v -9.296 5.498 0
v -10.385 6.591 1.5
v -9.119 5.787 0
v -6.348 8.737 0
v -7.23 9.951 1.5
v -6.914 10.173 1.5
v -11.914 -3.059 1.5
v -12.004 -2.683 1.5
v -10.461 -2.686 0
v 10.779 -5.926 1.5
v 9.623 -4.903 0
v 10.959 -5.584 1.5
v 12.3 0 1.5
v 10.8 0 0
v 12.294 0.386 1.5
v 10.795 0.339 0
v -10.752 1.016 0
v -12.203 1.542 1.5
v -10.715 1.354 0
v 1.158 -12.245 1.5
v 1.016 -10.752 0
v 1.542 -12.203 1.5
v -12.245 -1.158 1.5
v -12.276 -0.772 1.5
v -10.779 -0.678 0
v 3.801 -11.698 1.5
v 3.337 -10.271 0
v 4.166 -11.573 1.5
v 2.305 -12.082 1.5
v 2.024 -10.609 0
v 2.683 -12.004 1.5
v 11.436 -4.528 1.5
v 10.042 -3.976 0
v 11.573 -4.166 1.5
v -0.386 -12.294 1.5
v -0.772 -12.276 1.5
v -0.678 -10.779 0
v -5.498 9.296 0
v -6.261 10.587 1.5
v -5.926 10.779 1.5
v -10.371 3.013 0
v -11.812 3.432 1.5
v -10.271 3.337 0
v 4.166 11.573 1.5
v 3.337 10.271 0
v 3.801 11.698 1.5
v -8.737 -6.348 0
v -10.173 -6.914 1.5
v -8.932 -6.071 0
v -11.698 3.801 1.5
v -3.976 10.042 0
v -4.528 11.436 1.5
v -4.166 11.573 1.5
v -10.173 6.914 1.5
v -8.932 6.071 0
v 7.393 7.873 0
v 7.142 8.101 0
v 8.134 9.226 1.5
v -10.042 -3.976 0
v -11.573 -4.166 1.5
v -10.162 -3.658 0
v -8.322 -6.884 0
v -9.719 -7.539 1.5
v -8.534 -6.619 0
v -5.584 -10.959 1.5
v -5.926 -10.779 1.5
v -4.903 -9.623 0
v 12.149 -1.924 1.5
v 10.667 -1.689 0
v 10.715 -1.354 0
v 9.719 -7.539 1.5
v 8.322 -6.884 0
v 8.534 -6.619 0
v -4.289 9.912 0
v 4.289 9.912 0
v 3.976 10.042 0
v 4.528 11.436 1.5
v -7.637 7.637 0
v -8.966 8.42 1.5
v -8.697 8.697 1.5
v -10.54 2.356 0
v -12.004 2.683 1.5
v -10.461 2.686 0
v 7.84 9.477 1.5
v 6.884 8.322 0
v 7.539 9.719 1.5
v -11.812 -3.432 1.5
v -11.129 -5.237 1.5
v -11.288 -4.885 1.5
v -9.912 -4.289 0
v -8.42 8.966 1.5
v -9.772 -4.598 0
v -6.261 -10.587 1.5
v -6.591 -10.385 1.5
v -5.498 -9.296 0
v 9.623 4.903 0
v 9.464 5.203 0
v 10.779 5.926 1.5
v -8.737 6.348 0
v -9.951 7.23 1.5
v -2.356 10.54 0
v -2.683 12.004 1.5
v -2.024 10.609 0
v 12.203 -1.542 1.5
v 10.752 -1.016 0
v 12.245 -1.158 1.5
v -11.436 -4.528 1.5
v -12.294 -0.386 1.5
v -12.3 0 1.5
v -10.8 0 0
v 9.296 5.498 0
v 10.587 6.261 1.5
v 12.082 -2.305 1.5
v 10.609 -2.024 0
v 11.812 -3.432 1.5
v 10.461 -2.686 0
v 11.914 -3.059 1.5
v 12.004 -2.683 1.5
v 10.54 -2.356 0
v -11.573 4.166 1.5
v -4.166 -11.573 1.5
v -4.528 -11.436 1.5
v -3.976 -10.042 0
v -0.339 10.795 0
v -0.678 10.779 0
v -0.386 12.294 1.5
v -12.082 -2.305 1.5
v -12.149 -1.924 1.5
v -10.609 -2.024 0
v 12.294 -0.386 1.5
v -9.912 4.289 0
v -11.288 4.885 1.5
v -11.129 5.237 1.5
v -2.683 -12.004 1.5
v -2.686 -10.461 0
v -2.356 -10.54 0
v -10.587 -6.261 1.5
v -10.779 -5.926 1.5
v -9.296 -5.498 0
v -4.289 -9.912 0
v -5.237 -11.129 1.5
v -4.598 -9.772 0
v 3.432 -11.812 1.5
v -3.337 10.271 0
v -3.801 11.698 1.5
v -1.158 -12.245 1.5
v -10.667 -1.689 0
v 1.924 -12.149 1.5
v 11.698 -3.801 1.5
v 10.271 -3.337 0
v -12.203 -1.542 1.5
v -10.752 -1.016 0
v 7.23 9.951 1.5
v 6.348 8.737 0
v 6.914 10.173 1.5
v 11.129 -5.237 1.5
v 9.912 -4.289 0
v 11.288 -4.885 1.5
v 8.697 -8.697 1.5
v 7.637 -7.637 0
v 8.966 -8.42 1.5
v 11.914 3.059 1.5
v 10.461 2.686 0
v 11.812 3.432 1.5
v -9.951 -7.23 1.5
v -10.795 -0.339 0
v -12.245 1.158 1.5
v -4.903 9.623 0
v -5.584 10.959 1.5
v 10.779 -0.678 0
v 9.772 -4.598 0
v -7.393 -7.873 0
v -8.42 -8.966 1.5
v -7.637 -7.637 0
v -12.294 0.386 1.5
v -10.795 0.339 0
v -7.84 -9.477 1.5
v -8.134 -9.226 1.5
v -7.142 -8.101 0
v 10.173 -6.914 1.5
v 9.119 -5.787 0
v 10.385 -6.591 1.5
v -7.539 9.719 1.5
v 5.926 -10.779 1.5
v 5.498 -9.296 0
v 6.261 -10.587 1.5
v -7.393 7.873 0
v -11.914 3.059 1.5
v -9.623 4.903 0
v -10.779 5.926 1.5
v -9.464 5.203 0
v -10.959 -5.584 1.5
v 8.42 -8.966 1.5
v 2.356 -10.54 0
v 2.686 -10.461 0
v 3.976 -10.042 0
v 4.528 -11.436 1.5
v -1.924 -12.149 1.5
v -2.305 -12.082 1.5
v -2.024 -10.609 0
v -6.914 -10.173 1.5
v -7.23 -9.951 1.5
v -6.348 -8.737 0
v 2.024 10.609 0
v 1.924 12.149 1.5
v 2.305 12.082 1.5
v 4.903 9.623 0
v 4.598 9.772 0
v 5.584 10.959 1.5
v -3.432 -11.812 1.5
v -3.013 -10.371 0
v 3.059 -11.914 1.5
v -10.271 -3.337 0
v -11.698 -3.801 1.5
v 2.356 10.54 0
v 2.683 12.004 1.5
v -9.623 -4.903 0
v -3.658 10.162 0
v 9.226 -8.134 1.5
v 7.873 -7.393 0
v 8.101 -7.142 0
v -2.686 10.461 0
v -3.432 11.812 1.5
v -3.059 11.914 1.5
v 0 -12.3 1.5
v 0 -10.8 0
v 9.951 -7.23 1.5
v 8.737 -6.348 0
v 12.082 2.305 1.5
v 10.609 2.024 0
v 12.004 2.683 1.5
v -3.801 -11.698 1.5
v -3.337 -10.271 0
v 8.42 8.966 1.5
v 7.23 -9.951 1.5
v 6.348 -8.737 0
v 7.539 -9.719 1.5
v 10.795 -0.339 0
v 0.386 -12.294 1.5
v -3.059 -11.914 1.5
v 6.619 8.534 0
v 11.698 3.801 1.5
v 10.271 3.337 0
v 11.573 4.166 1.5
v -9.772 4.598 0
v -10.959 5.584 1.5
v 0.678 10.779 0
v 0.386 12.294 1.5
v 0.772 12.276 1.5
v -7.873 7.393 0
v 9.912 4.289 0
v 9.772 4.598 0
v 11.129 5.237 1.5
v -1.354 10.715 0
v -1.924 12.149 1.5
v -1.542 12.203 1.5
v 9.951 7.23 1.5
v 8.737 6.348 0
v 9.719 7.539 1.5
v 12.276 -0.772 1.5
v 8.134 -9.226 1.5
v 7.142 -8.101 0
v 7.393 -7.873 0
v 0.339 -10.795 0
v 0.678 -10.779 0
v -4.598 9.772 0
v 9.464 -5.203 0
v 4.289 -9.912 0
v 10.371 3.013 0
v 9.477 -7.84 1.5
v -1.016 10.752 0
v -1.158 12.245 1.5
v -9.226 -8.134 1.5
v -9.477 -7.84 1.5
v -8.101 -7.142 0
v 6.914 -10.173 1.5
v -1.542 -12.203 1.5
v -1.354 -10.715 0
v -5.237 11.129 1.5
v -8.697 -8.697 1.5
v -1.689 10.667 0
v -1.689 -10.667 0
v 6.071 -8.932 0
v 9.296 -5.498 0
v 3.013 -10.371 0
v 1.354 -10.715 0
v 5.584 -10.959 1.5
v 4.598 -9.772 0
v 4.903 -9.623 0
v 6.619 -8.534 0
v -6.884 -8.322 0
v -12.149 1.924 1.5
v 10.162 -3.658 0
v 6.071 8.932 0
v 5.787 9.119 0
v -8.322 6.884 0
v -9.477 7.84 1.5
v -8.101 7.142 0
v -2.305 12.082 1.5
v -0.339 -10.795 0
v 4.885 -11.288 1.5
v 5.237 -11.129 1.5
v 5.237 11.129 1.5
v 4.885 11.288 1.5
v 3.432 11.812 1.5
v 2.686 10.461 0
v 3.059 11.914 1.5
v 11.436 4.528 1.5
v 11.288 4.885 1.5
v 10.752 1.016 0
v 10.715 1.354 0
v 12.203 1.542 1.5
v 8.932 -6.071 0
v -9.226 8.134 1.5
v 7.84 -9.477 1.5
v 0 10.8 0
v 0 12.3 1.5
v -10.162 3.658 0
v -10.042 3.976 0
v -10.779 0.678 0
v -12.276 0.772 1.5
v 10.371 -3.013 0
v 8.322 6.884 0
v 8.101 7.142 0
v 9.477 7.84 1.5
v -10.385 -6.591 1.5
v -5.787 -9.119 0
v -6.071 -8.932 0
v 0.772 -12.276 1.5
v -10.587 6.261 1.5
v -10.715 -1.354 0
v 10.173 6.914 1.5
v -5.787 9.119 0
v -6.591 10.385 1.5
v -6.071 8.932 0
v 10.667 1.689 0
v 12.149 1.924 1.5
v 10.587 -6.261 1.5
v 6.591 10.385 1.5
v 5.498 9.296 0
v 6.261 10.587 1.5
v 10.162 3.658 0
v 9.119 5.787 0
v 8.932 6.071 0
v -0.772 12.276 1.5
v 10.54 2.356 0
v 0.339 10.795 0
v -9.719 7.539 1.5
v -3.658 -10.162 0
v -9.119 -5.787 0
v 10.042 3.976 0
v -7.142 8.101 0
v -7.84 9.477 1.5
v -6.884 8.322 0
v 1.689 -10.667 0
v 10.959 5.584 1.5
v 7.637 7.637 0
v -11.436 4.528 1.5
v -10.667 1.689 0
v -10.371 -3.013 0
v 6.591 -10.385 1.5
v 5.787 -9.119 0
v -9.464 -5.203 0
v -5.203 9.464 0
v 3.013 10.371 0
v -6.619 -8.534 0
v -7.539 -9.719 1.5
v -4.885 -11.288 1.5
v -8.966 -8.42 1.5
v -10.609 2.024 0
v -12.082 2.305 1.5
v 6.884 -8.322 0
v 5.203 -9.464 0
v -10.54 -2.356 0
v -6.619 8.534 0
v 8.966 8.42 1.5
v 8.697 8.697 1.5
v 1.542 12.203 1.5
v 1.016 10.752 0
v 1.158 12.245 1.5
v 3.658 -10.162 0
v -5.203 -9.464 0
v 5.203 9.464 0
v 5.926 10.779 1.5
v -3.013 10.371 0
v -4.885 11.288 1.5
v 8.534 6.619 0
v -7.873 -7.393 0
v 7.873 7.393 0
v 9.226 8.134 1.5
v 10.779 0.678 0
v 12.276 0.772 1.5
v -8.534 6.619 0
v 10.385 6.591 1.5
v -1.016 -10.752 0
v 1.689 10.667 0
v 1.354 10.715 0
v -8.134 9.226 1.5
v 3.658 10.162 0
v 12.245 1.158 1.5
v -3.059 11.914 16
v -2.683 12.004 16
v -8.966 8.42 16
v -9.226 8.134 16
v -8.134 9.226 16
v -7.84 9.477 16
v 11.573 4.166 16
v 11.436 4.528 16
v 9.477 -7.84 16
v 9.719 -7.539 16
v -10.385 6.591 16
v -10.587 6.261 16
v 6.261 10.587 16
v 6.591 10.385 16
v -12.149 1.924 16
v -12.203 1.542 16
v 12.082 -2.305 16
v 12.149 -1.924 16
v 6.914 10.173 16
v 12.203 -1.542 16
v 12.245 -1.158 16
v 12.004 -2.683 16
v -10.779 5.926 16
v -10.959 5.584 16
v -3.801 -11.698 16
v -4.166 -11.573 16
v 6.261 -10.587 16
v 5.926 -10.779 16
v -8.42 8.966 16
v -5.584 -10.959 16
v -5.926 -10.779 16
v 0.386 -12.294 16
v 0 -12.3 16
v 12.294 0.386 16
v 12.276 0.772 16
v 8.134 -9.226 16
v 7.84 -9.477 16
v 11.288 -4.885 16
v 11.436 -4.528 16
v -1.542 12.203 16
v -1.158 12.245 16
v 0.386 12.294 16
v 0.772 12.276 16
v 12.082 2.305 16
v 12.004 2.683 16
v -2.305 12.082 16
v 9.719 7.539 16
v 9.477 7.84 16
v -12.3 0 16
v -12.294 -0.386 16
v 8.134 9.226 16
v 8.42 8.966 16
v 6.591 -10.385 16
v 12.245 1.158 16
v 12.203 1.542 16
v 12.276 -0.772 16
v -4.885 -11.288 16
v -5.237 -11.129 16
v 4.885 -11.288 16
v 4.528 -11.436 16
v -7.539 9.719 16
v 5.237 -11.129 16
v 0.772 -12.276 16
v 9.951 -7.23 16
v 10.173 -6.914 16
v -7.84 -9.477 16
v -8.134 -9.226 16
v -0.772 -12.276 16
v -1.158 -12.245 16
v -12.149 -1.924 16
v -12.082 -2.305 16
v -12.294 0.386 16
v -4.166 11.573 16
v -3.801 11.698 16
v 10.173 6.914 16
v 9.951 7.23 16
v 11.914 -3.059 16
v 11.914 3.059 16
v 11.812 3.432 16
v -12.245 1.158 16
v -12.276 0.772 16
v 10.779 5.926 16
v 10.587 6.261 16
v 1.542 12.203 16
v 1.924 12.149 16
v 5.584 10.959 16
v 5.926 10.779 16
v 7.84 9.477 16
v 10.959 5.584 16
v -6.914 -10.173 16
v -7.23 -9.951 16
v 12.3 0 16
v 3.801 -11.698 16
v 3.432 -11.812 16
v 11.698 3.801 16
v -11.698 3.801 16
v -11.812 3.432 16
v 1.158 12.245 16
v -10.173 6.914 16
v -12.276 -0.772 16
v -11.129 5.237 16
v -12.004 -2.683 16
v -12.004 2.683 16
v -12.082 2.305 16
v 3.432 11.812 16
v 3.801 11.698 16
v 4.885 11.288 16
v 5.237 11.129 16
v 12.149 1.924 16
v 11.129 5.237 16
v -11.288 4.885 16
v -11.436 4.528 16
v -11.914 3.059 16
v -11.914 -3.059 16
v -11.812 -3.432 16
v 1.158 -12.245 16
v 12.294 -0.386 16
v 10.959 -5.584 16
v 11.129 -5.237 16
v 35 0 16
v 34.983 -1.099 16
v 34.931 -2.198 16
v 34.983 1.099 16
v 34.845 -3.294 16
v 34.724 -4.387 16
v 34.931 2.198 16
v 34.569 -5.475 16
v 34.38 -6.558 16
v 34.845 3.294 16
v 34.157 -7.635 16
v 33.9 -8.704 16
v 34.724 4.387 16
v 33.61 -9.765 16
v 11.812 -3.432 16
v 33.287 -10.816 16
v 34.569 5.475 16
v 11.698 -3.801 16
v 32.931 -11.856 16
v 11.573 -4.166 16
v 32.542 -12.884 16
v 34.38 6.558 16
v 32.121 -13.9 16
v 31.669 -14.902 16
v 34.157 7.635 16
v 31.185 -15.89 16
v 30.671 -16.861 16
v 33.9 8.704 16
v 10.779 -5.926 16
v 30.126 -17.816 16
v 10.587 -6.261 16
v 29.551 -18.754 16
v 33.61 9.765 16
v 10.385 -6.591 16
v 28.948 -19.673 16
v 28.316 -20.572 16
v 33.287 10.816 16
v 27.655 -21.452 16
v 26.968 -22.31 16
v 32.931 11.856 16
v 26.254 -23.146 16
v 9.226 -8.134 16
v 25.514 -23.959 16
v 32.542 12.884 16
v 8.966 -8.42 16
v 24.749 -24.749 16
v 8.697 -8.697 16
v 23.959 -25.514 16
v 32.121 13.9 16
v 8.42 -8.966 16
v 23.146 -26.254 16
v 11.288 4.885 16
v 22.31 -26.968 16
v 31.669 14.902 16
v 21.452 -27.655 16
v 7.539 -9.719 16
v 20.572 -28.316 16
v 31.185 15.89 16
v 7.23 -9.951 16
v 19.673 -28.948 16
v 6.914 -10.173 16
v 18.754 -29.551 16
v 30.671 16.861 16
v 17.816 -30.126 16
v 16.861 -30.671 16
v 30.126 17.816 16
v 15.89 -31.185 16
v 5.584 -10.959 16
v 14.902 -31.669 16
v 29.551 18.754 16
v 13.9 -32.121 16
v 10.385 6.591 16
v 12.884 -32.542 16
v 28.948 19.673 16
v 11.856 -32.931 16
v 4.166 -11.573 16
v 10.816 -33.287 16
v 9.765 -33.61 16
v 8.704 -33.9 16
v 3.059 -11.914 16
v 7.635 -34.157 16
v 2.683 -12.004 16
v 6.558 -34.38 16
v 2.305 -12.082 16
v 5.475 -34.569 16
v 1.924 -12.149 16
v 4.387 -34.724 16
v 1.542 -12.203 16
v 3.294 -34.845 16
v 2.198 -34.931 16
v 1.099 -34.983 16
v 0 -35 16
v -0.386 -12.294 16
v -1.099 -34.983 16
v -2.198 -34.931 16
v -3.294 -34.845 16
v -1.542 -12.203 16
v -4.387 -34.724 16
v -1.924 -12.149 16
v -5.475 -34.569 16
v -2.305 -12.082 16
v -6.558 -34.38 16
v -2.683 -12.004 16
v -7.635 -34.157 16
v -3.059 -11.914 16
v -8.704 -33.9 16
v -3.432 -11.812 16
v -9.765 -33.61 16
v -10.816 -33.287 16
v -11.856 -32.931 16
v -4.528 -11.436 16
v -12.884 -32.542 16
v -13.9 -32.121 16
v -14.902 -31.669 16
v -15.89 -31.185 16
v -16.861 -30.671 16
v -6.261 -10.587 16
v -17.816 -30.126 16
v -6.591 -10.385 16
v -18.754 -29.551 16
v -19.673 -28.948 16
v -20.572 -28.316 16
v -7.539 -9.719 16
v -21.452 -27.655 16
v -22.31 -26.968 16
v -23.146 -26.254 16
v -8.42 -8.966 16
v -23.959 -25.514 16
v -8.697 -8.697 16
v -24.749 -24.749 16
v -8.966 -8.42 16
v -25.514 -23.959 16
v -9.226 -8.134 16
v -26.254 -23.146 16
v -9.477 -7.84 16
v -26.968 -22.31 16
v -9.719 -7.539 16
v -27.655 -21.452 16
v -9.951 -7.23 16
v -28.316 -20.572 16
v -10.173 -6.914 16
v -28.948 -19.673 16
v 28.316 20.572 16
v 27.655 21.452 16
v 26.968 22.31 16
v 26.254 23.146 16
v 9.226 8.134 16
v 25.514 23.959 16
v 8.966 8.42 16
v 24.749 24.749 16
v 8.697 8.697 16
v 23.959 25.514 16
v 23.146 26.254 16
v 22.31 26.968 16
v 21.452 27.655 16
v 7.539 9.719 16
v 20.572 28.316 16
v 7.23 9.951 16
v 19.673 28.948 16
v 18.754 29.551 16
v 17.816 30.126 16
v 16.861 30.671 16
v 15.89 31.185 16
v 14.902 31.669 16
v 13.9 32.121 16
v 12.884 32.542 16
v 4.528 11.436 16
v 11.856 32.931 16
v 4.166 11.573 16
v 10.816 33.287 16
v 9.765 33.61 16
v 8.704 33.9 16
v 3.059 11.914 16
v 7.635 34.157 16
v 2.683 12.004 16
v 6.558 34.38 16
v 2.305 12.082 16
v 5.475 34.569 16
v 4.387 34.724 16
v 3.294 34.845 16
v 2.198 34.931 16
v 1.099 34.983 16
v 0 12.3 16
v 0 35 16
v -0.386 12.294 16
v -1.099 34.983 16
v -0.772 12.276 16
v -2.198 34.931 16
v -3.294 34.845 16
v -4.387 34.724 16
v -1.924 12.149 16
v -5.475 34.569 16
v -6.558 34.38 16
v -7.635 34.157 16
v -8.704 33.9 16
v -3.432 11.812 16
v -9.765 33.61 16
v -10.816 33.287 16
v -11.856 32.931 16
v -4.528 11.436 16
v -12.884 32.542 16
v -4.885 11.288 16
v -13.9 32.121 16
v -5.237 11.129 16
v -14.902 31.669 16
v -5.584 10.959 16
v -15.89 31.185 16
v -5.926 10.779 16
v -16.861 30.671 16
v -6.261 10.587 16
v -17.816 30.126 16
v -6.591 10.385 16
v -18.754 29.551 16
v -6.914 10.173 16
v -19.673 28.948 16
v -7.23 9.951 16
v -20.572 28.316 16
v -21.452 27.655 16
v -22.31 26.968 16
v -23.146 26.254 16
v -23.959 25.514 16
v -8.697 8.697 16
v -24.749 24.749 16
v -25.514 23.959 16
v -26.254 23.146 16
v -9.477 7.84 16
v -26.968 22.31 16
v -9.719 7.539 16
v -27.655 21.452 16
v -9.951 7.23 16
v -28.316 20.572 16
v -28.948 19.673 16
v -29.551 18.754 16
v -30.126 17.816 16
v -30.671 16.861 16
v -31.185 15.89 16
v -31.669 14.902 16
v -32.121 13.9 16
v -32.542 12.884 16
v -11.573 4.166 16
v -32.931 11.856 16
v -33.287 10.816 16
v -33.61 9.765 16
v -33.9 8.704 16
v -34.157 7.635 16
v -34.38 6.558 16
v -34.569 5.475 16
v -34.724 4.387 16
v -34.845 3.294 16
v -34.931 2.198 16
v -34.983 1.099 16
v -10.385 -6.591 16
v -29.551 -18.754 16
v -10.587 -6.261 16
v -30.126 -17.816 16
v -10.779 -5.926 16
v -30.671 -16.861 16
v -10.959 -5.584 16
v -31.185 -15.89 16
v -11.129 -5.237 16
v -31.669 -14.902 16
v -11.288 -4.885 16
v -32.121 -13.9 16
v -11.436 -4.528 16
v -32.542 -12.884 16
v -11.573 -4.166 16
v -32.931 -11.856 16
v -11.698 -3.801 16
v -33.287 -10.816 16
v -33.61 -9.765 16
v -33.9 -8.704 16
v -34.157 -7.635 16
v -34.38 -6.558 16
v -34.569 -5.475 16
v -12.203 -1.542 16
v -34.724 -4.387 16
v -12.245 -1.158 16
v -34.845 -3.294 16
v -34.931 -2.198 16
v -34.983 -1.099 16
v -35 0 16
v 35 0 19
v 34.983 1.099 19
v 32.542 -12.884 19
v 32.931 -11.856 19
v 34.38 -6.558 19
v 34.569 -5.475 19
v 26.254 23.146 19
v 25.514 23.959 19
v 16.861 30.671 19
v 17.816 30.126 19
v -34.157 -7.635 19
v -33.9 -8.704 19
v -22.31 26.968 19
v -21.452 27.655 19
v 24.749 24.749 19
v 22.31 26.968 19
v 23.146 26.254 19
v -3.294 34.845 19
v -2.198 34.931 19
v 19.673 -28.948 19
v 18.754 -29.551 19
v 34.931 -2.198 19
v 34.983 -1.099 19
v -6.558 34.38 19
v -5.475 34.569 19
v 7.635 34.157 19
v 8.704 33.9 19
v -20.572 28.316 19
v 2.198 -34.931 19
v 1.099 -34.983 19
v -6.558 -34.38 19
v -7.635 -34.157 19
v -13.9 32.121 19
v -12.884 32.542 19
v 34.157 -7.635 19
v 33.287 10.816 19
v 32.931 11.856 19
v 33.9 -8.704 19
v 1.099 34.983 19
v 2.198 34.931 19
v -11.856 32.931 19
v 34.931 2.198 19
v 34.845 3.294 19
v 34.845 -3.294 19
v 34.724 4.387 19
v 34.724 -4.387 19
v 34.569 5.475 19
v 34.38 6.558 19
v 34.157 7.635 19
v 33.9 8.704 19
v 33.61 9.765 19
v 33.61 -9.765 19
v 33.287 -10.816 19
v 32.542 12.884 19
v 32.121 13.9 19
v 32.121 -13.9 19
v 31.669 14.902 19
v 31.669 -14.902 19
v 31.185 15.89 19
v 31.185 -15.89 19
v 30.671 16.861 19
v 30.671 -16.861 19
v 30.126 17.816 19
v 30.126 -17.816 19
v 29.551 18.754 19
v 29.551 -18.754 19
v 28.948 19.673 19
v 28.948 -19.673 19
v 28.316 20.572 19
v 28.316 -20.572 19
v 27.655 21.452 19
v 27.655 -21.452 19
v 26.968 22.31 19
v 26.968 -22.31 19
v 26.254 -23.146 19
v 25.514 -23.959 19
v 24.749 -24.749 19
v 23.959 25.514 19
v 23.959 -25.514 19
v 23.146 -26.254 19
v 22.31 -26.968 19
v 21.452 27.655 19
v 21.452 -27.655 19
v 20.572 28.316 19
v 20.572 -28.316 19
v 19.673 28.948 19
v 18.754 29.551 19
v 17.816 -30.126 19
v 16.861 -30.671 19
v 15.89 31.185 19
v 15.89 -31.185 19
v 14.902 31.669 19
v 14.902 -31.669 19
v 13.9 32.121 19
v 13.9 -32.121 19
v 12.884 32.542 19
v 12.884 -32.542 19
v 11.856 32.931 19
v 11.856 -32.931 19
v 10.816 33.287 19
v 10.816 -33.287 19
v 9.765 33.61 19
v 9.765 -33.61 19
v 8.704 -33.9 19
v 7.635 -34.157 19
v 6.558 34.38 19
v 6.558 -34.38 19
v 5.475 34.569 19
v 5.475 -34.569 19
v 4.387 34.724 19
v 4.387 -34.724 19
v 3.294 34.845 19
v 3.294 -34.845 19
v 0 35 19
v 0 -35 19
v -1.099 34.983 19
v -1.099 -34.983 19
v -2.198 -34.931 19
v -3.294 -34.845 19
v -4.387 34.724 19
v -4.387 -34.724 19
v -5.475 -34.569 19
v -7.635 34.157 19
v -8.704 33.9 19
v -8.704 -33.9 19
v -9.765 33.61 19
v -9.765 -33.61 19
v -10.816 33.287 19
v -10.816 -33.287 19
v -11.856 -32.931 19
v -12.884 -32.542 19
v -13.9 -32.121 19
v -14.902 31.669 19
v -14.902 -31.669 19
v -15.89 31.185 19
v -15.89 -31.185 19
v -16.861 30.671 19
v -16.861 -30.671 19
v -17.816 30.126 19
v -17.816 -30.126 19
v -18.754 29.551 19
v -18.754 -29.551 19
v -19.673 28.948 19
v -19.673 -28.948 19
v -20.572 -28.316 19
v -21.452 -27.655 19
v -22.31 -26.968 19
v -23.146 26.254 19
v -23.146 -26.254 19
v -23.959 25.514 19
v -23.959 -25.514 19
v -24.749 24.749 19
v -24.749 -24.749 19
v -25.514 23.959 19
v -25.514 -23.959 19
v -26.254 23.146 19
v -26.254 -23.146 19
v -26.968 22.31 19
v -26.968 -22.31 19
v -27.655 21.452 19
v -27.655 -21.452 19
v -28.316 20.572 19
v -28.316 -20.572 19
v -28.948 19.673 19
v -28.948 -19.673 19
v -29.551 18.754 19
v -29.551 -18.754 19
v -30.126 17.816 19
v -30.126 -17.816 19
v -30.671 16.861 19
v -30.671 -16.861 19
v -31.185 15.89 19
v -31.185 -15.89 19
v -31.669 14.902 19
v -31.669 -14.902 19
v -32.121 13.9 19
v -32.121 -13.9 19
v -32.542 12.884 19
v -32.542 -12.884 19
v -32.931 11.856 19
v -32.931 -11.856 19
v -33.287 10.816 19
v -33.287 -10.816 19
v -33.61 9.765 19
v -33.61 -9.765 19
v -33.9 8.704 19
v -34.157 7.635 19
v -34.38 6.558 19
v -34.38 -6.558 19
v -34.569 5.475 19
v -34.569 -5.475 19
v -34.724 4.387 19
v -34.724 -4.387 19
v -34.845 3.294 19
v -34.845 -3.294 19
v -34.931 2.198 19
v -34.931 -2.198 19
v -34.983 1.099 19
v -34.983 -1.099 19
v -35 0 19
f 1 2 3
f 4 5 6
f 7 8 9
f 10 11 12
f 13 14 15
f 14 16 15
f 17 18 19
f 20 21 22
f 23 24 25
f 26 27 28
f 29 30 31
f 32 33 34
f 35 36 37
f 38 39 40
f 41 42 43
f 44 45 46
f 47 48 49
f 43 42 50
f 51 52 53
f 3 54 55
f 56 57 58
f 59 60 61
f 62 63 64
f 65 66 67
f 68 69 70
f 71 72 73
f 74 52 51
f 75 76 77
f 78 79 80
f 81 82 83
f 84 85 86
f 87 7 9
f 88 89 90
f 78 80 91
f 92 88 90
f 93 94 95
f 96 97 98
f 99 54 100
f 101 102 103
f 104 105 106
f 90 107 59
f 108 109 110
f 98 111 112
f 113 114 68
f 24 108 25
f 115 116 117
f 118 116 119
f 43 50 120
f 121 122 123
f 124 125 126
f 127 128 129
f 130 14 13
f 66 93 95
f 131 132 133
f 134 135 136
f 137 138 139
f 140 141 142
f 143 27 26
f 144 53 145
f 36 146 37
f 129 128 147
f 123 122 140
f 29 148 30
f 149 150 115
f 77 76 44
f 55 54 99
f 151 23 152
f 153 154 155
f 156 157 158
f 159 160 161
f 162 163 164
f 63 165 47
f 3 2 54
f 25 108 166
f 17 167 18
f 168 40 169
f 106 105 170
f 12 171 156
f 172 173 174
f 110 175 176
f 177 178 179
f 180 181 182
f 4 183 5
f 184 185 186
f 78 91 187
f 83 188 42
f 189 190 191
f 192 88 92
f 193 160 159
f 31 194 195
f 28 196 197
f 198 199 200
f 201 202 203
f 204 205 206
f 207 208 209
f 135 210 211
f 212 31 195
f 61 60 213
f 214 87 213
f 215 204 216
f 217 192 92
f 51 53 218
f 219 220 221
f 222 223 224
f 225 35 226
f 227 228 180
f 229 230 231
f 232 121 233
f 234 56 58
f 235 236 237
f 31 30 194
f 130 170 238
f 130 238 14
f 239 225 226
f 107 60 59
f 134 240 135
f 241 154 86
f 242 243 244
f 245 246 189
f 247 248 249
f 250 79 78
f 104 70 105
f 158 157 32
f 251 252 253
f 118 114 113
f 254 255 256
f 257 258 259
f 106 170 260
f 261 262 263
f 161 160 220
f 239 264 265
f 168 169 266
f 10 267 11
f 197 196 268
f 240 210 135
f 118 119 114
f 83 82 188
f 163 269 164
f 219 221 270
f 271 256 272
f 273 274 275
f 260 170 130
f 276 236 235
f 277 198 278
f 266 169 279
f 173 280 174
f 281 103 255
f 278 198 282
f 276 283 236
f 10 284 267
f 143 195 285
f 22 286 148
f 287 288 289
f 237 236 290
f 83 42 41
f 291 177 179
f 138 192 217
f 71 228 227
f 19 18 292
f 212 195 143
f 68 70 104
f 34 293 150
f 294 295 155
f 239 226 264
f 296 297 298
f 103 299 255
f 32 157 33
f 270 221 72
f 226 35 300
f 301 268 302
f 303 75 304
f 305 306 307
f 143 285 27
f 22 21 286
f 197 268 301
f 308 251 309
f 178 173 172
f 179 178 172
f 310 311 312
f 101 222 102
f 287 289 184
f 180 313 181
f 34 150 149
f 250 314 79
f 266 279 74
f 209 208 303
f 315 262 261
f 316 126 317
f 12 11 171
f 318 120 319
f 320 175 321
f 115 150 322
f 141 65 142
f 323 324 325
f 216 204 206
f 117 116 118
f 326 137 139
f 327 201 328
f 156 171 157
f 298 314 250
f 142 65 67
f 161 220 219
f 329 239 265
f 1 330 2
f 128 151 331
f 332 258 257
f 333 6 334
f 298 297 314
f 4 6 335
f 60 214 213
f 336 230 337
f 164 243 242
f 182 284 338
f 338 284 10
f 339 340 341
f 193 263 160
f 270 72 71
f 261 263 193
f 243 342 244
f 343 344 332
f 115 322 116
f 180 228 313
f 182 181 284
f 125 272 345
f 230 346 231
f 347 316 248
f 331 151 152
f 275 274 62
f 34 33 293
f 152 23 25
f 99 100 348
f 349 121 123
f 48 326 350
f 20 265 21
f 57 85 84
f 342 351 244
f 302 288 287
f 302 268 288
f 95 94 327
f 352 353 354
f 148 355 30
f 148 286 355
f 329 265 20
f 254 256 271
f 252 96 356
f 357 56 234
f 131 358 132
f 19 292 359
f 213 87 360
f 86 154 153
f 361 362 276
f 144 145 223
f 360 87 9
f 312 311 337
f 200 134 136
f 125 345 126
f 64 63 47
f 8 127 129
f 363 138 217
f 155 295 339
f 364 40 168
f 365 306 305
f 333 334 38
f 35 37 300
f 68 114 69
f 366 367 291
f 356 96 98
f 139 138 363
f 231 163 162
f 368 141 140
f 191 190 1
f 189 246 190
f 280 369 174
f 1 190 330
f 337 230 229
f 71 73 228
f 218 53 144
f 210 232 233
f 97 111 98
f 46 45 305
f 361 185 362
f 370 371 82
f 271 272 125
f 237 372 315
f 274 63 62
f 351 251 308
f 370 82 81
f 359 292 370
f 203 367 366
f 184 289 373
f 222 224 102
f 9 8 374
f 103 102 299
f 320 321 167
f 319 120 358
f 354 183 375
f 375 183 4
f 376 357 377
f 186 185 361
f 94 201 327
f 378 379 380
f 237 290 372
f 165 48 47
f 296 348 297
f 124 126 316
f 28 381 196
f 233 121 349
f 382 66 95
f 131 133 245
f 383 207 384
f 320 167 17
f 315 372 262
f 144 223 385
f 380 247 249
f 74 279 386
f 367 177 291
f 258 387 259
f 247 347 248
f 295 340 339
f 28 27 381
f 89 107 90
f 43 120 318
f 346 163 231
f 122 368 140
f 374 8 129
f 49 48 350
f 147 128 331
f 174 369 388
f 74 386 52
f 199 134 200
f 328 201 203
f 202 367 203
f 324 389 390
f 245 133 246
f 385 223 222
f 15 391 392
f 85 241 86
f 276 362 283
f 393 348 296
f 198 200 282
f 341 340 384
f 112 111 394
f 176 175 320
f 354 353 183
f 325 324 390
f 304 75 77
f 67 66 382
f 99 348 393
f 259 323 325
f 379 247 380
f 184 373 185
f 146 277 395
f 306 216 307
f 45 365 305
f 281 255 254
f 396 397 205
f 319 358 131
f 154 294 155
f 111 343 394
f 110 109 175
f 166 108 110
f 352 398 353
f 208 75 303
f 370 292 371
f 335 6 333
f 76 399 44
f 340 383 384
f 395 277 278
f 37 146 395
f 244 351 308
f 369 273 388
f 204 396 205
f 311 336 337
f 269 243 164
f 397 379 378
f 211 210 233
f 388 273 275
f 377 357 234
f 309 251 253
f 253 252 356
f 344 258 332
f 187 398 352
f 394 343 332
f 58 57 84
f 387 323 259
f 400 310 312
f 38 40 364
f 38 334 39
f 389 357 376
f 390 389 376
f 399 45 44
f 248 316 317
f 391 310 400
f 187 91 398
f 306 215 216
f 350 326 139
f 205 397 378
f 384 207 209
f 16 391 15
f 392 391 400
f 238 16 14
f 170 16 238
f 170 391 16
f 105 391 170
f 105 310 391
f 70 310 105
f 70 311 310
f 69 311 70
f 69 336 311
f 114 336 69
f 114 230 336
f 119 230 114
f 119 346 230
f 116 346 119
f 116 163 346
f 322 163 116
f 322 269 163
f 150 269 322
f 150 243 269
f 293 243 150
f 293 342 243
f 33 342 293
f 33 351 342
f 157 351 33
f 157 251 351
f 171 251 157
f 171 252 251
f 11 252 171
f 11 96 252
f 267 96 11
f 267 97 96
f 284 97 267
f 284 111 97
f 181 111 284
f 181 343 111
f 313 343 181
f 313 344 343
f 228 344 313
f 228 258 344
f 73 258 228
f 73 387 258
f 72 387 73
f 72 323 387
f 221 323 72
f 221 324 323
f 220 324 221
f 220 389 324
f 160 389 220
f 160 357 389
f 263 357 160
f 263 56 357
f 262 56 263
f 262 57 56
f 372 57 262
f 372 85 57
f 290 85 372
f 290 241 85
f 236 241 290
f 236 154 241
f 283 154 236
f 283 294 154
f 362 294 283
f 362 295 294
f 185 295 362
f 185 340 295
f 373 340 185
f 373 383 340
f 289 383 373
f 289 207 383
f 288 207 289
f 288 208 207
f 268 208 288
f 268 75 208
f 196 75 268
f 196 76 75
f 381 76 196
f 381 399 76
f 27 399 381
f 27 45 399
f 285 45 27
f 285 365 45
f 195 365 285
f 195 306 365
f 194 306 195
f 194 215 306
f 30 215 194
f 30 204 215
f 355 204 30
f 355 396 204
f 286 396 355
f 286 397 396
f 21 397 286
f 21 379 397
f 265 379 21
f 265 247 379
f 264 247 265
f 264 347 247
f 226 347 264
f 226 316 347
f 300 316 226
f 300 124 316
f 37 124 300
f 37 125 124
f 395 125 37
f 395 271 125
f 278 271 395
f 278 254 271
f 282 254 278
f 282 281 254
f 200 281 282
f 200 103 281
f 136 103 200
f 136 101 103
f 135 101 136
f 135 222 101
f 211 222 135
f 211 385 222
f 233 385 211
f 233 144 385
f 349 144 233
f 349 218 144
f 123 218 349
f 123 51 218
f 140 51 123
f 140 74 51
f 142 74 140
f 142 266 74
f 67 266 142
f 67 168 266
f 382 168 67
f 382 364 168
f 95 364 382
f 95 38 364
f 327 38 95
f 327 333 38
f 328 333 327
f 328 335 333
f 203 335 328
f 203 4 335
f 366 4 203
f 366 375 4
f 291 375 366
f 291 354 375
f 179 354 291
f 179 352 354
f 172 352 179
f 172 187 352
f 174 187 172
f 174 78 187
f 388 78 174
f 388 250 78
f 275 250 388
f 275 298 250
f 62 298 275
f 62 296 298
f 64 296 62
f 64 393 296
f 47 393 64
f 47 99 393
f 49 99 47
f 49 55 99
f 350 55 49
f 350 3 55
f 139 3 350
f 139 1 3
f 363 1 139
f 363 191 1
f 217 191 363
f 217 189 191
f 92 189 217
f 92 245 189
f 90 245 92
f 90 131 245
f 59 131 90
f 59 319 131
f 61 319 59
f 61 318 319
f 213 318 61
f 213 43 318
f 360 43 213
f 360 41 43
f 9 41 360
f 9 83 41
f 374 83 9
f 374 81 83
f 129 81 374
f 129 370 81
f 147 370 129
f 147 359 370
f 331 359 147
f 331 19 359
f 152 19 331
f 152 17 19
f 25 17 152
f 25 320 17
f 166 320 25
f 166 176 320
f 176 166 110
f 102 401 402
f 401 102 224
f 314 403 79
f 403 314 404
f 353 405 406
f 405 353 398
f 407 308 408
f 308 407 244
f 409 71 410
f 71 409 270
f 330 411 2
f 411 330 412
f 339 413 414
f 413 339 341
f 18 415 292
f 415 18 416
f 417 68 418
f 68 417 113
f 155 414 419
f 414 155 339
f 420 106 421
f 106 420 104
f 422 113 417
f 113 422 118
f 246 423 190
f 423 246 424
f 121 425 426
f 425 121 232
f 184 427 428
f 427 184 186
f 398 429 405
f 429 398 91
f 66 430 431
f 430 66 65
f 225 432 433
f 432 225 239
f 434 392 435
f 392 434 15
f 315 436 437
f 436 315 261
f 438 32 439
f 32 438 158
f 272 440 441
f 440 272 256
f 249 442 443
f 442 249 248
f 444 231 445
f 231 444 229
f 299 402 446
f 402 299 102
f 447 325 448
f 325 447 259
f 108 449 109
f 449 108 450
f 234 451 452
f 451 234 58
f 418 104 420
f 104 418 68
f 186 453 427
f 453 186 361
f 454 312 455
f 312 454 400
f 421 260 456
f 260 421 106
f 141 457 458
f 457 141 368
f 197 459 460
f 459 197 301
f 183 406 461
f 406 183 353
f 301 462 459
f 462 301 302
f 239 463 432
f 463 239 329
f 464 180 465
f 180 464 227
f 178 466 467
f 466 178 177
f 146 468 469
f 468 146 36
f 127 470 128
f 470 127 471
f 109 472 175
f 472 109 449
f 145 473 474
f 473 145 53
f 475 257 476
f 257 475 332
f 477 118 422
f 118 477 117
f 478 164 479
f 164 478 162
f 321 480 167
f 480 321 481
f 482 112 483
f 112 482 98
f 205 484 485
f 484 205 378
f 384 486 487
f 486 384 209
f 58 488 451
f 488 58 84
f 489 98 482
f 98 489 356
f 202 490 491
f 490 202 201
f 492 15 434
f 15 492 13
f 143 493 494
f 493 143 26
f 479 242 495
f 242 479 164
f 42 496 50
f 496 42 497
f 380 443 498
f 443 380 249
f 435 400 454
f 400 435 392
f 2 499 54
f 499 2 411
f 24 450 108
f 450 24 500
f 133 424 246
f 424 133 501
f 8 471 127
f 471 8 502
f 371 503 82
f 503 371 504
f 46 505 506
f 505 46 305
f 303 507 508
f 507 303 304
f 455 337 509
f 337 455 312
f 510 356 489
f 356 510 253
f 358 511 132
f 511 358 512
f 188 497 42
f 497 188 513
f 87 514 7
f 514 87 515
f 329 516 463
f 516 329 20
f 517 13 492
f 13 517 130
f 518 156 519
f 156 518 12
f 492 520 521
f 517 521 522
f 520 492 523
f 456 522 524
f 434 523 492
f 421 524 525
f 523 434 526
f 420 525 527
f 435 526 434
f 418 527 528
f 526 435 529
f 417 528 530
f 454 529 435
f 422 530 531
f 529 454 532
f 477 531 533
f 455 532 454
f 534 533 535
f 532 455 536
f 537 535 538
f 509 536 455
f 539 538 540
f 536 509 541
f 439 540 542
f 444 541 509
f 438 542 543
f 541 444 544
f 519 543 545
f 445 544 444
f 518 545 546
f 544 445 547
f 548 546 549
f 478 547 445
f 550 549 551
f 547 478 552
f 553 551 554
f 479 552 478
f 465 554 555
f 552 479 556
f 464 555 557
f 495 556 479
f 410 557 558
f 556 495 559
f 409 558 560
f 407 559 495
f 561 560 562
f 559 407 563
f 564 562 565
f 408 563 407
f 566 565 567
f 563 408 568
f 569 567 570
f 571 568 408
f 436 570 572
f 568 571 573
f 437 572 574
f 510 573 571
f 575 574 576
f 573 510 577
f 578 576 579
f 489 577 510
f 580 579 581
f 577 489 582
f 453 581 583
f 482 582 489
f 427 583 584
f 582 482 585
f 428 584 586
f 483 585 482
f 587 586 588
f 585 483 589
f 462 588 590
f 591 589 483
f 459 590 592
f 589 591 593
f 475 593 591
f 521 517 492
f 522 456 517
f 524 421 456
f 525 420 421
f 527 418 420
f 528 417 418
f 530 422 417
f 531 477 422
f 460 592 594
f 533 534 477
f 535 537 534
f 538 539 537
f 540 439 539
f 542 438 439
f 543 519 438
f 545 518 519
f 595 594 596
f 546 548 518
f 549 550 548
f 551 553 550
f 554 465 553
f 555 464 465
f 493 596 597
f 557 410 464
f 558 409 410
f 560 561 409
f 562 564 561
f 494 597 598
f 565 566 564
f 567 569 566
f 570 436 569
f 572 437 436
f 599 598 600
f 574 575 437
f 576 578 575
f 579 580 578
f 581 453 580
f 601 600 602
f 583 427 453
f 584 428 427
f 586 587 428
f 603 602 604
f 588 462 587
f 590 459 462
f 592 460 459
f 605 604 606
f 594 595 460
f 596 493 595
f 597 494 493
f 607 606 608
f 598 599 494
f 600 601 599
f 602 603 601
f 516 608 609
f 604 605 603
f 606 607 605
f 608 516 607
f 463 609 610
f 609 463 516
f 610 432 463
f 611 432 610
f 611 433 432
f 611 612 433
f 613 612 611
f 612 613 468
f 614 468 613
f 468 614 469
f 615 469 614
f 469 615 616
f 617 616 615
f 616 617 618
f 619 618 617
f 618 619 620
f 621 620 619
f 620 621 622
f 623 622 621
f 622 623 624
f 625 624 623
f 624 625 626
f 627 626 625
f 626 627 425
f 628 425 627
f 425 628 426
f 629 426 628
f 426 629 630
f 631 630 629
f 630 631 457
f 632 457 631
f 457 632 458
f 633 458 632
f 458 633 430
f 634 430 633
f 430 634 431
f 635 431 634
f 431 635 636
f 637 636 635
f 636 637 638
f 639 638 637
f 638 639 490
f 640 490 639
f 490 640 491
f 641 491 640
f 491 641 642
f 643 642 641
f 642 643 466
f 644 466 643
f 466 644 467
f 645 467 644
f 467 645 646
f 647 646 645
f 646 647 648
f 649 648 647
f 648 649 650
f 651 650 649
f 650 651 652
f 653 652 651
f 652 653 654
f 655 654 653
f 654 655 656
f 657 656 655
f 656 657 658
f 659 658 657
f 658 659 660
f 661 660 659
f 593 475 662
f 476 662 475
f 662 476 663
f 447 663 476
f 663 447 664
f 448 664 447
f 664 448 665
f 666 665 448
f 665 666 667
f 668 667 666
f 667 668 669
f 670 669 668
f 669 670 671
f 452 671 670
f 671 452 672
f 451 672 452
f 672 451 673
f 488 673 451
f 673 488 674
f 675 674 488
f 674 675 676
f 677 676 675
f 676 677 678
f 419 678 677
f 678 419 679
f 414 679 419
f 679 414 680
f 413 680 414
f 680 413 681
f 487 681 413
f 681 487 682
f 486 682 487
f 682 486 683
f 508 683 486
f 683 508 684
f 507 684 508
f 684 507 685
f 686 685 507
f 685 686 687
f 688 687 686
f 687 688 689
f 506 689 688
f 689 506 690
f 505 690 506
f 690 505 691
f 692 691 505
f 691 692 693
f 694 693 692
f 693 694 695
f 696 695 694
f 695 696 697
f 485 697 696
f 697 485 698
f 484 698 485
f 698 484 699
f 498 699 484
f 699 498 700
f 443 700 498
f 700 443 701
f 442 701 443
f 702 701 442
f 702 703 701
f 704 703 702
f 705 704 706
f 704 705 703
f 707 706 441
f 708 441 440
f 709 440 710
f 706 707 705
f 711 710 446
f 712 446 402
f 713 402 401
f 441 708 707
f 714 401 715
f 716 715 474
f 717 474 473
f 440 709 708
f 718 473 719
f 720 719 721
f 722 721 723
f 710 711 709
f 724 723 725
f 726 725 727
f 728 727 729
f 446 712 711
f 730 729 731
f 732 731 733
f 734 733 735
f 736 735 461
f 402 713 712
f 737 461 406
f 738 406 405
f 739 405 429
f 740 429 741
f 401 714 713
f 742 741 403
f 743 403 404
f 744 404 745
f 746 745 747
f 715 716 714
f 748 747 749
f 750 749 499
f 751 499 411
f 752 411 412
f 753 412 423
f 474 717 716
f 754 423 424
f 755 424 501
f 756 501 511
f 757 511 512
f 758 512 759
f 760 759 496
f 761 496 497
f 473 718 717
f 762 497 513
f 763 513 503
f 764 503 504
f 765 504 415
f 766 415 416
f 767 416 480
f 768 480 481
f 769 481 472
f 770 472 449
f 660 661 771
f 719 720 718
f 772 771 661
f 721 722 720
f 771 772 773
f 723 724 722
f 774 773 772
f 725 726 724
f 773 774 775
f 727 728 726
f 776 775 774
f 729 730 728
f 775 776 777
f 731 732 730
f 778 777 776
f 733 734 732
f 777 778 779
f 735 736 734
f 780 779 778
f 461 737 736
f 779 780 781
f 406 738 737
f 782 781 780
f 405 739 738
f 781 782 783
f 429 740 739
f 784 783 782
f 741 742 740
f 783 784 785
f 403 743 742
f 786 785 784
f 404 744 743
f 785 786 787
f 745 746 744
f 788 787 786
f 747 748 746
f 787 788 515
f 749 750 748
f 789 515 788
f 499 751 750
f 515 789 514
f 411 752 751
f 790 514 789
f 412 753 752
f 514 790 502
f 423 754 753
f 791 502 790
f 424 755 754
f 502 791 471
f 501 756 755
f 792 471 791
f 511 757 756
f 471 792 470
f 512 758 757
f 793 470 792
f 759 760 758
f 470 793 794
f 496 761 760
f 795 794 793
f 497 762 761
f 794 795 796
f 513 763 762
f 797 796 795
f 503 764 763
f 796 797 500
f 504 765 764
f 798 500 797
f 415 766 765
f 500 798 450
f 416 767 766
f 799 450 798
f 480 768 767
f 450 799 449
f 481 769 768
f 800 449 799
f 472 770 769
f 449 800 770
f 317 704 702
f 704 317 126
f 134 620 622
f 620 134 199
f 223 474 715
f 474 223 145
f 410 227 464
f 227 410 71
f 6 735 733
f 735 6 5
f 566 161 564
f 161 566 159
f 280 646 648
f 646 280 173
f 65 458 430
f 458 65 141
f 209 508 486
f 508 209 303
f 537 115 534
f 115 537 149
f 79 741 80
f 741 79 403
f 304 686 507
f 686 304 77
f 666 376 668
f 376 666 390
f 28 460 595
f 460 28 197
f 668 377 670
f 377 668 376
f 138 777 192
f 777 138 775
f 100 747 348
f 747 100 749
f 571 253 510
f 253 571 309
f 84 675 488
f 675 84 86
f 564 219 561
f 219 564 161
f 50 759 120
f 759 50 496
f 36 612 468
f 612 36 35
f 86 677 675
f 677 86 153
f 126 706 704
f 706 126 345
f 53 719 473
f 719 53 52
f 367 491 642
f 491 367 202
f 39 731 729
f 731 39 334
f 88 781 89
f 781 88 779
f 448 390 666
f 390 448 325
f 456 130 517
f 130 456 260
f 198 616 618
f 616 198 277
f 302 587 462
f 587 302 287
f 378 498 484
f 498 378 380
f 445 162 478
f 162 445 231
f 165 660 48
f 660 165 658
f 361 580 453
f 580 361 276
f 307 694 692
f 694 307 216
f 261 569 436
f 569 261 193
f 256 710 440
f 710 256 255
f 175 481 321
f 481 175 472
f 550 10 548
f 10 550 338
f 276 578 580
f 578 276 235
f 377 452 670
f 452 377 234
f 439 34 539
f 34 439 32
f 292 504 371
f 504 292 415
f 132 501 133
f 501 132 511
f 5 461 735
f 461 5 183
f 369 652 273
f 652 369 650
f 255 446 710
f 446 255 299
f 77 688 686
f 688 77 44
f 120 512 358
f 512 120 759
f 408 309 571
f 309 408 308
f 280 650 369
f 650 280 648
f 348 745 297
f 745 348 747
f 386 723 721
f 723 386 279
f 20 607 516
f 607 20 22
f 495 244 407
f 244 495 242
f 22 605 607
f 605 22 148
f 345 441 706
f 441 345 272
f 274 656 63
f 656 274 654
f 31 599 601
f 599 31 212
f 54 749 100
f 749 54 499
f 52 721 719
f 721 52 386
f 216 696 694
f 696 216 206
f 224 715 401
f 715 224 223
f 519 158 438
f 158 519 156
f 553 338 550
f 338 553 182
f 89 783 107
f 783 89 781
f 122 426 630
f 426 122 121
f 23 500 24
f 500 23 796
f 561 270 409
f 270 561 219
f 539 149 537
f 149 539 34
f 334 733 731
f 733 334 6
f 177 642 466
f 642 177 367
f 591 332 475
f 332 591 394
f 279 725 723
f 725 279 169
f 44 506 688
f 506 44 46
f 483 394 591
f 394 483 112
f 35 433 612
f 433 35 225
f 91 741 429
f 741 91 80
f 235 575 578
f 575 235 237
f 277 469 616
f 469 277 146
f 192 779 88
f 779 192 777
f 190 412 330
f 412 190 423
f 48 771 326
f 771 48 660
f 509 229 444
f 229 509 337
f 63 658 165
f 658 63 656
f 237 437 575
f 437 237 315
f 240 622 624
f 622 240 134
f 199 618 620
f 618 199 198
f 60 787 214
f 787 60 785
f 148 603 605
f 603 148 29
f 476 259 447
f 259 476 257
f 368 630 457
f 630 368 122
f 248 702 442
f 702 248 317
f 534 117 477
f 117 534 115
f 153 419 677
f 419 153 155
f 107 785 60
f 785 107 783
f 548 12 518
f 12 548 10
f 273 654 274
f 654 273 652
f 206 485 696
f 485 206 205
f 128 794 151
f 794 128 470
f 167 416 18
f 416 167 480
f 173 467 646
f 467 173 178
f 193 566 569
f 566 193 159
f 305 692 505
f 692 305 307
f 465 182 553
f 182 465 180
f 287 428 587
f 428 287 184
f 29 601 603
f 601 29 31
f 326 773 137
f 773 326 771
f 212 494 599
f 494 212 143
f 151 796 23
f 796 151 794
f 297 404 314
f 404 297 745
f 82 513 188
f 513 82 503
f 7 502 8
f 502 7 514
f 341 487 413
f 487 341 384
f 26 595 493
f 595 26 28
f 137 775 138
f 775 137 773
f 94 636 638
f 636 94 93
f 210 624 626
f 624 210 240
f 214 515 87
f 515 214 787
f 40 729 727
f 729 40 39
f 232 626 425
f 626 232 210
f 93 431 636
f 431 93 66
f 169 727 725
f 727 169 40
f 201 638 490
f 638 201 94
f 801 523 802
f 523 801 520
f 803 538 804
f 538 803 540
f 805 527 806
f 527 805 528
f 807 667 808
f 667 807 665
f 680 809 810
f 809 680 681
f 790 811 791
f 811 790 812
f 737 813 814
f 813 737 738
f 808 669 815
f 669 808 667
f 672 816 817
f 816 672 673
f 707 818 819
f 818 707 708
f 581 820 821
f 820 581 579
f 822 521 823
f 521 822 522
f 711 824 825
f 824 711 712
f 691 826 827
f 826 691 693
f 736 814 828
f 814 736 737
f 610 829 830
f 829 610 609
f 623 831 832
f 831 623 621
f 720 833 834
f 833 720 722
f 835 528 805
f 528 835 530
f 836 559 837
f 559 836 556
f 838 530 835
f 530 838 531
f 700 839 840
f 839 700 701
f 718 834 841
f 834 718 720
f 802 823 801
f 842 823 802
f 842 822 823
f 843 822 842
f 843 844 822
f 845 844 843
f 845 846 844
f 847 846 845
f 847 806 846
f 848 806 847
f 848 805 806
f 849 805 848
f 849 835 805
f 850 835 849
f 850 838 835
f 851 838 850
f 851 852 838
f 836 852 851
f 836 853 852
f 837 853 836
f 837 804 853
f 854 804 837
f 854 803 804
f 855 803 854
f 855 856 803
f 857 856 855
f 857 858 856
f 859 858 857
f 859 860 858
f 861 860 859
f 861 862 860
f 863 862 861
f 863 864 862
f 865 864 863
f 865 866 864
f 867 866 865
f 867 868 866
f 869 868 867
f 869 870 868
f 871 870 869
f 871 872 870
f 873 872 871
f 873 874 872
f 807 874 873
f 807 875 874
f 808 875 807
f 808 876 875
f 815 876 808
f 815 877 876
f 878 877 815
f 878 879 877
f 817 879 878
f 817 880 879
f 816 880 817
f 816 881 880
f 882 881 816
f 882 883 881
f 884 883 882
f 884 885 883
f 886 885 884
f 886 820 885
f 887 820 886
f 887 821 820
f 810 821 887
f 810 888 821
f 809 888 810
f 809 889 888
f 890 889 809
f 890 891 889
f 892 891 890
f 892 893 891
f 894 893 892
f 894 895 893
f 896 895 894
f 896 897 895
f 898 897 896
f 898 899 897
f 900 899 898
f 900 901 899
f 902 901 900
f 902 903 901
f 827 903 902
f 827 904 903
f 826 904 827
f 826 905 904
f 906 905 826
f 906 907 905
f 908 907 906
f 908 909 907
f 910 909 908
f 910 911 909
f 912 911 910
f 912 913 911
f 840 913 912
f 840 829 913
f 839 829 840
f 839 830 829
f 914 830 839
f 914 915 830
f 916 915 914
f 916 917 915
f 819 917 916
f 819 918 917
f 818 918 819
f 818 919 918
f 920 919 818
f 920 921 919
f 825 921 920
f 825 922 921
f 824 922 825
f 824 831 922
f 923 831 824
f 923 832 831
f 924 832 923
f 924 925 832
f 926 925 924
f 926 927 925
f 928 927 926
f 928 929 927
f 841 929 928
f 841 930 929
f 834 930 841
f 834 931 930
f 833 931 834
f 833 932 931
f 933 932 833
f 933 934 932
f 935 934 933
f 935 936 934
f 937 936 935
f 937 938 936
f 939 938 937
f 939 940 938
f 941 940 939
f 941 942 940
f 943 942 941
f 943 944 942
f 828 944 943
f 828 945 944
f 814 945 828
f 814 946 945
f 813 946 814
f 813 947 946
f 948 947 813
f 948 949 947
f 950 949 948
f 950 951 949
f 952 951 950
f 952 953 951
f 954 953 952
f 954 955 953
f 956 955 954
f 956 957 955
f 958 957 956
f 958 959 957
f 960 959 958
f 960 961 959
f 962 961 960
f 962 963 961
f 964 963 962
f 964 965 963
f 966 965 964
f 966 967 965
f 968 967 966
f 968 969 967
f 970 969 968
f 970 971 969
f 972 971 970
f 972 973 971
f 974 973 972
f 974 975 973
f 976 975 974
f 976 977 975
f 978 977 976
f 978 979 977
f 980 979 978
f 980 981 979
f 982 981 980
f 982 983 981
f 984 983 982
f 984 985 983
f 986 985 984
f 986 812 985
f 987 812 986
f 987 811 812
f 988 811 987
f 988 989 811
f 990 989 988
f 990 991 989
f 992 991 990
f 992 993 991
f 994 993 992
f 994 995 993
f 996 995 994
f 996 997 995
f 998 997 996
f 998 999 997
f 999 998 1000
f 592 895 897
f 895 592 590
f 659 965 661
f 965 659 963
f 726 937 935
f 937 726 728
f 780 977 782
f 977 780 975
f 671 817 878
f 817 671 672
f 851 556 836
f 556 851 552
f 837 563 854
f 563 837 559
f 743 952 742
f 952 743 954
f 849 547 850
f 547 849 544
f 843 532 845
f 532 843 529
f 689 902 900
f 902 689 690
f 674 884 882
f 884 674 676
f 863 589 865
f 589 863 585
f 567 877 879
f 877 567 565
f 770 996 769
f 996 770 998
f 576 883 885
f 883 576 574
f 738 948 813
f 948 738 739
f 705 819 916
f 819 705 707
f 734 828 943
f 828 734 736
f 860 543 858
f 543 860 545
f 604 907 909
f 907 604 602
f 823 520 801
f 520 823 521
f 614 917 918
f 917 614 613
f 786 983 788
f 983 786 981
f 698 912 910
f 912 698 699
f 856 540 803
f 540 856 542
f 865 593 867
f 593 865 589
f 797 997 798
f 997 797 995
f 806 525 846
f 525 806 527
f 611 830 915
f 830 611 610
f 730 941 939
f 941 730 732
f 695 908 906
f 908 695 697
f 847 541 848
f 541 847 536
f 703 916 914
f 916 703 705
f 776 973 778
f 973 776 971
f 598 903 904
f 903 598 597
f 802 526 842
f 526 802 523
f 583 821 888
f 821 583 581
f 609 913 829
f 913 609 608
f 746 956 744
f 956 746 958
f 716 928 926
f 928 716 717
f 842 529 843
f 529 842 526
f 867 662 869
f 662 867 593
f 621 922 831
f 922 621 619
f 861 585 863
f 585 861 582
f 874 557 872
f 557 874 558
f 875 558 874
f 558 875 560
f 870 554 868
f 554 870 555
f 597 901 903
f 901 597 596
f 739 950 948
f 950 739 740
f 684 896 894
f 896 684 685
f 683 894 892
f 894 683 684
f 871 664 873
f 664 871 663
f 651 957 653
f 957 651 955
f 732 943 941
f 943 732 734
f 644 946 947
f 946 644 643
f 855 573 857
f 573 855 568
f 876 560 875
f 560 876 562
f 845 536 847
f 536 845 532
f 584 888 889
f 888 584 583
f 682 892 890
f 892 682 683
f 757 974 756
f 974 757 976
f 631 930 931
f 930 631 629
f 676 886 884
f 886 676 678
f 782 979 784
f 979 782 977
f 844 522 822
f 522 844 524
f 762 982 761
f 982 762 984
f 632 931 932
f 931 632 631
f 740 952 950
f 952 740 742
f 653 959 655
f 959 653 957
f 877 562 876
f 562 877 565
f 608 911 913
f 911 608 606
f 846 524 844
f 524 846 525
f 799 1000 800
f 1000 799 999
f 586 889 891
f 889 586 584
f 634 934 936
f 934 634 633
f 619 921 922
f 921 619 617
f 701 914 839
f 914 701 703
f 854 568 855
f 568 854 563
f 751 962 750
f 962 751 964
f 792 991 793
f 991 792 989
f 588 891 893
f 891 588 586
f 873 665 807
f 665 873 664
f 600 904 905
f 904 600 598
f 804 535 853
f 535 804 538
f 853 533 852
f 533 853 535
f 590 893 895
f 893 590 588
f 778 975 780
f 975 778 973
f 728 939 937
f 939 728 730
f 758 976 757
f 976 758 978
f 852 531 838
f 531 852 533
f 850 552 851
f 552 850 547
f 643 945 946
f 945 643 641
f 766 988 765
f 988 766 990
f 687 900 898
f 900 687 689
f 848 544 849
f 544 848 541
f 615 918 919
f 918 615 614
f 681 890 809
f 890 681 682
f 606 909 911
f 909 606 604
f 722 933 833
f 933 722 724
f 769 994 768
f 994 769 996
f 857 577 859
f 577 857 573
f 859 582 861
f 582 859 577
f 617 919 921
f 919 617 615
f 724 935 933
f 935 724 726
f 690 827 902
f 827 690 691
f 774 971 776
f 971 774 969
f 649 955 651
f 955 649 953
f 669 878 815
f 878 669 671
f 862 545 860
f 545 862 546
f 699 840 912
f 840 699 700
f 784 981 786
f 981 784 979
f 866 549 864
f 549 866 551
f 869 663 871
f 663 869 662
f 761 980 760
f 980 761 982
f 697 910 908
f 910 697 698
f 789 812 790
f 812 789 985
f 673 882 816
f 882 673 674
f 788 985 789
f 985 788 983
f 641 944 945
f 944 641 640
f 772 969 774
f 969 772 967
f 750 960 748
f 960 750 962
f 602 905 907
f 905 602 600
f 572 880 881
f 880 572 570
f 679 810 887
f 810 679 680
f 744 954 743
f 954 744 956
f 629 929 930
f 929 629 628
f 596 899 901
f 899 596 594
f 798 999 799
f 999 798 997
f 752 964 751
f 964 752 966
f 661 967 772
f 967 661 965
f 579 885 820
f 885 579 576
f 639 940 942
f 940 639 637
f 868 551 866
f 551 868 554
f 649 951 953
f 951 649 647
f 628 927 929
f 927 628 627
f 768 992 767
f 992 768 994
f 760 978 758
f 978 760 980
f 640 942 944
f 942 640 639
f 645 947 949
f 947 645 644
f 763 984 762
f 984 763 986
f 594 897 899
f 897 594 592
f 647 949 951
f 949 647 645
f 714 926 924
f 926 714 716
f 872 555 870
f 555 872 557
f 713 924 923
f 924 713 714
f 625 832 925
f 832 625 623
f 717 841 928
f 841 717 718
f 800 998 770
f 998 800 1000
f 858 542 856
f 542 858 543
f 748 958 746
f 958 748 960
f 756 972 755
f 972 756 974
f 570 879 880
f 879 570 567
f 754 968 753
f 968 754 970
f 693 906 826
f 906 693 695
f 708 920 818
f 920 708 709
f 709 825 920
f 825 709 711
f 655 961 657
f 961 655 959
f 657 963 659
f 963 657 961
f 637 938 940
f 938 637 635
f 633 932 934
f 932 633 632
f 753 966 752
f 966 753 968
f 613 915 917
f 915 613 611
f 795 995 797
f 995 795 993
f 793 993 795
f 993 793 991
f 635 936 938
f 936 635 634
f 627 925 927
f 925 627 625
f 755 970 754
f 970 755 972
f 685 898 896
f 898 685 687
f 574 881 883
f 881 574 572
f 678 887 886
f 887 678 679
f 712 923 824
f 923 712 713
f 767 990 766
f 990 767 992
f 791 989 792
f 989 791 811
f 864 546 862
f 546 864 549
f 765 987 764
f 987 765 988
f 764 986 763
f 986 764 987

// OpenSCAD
// Variante B: Deckel mit Zapfen (top-hat) fuer das verkuerzte Piraten-Fernrohr
// -> passend, wenn 70 mm der Aussenrand und 25 mm die mittige Oeffnung ist.
// Masse aendern, dann F6 (Render) und als STL exportieren.

lid_d     = 70;    // Aussendurchmesser des Deckels
lid_th    = 3;     // Dicke des Deckels
hole_d    = 25;    // Durchmesser der Oeffnung/Bohrung
clearance = 0.4;   // Spiel (zu stramm? groesser. zu locker? kleiner)
plug_len  = 16;    // Laenge des Zapfens
chamfer   = 1.5;   // Einfuehr-Fase am Zapfen

$fn = 200;

plug_d = hole_d - clearance;

union() {
    // Zapfen mit Einfuehr-Fase unten
    cylinder(d1 = plug_d - 2*chamfer, d2 = plug_d, h = chamfer);
    translate([0,0,chamfer])
        cylinder(d = plug_d, h = plug_len - chamfer);
    // Deckel oben
    translate([0,0,plug_len])
        cylinder(d = lid_d, h = lid_th);
}
